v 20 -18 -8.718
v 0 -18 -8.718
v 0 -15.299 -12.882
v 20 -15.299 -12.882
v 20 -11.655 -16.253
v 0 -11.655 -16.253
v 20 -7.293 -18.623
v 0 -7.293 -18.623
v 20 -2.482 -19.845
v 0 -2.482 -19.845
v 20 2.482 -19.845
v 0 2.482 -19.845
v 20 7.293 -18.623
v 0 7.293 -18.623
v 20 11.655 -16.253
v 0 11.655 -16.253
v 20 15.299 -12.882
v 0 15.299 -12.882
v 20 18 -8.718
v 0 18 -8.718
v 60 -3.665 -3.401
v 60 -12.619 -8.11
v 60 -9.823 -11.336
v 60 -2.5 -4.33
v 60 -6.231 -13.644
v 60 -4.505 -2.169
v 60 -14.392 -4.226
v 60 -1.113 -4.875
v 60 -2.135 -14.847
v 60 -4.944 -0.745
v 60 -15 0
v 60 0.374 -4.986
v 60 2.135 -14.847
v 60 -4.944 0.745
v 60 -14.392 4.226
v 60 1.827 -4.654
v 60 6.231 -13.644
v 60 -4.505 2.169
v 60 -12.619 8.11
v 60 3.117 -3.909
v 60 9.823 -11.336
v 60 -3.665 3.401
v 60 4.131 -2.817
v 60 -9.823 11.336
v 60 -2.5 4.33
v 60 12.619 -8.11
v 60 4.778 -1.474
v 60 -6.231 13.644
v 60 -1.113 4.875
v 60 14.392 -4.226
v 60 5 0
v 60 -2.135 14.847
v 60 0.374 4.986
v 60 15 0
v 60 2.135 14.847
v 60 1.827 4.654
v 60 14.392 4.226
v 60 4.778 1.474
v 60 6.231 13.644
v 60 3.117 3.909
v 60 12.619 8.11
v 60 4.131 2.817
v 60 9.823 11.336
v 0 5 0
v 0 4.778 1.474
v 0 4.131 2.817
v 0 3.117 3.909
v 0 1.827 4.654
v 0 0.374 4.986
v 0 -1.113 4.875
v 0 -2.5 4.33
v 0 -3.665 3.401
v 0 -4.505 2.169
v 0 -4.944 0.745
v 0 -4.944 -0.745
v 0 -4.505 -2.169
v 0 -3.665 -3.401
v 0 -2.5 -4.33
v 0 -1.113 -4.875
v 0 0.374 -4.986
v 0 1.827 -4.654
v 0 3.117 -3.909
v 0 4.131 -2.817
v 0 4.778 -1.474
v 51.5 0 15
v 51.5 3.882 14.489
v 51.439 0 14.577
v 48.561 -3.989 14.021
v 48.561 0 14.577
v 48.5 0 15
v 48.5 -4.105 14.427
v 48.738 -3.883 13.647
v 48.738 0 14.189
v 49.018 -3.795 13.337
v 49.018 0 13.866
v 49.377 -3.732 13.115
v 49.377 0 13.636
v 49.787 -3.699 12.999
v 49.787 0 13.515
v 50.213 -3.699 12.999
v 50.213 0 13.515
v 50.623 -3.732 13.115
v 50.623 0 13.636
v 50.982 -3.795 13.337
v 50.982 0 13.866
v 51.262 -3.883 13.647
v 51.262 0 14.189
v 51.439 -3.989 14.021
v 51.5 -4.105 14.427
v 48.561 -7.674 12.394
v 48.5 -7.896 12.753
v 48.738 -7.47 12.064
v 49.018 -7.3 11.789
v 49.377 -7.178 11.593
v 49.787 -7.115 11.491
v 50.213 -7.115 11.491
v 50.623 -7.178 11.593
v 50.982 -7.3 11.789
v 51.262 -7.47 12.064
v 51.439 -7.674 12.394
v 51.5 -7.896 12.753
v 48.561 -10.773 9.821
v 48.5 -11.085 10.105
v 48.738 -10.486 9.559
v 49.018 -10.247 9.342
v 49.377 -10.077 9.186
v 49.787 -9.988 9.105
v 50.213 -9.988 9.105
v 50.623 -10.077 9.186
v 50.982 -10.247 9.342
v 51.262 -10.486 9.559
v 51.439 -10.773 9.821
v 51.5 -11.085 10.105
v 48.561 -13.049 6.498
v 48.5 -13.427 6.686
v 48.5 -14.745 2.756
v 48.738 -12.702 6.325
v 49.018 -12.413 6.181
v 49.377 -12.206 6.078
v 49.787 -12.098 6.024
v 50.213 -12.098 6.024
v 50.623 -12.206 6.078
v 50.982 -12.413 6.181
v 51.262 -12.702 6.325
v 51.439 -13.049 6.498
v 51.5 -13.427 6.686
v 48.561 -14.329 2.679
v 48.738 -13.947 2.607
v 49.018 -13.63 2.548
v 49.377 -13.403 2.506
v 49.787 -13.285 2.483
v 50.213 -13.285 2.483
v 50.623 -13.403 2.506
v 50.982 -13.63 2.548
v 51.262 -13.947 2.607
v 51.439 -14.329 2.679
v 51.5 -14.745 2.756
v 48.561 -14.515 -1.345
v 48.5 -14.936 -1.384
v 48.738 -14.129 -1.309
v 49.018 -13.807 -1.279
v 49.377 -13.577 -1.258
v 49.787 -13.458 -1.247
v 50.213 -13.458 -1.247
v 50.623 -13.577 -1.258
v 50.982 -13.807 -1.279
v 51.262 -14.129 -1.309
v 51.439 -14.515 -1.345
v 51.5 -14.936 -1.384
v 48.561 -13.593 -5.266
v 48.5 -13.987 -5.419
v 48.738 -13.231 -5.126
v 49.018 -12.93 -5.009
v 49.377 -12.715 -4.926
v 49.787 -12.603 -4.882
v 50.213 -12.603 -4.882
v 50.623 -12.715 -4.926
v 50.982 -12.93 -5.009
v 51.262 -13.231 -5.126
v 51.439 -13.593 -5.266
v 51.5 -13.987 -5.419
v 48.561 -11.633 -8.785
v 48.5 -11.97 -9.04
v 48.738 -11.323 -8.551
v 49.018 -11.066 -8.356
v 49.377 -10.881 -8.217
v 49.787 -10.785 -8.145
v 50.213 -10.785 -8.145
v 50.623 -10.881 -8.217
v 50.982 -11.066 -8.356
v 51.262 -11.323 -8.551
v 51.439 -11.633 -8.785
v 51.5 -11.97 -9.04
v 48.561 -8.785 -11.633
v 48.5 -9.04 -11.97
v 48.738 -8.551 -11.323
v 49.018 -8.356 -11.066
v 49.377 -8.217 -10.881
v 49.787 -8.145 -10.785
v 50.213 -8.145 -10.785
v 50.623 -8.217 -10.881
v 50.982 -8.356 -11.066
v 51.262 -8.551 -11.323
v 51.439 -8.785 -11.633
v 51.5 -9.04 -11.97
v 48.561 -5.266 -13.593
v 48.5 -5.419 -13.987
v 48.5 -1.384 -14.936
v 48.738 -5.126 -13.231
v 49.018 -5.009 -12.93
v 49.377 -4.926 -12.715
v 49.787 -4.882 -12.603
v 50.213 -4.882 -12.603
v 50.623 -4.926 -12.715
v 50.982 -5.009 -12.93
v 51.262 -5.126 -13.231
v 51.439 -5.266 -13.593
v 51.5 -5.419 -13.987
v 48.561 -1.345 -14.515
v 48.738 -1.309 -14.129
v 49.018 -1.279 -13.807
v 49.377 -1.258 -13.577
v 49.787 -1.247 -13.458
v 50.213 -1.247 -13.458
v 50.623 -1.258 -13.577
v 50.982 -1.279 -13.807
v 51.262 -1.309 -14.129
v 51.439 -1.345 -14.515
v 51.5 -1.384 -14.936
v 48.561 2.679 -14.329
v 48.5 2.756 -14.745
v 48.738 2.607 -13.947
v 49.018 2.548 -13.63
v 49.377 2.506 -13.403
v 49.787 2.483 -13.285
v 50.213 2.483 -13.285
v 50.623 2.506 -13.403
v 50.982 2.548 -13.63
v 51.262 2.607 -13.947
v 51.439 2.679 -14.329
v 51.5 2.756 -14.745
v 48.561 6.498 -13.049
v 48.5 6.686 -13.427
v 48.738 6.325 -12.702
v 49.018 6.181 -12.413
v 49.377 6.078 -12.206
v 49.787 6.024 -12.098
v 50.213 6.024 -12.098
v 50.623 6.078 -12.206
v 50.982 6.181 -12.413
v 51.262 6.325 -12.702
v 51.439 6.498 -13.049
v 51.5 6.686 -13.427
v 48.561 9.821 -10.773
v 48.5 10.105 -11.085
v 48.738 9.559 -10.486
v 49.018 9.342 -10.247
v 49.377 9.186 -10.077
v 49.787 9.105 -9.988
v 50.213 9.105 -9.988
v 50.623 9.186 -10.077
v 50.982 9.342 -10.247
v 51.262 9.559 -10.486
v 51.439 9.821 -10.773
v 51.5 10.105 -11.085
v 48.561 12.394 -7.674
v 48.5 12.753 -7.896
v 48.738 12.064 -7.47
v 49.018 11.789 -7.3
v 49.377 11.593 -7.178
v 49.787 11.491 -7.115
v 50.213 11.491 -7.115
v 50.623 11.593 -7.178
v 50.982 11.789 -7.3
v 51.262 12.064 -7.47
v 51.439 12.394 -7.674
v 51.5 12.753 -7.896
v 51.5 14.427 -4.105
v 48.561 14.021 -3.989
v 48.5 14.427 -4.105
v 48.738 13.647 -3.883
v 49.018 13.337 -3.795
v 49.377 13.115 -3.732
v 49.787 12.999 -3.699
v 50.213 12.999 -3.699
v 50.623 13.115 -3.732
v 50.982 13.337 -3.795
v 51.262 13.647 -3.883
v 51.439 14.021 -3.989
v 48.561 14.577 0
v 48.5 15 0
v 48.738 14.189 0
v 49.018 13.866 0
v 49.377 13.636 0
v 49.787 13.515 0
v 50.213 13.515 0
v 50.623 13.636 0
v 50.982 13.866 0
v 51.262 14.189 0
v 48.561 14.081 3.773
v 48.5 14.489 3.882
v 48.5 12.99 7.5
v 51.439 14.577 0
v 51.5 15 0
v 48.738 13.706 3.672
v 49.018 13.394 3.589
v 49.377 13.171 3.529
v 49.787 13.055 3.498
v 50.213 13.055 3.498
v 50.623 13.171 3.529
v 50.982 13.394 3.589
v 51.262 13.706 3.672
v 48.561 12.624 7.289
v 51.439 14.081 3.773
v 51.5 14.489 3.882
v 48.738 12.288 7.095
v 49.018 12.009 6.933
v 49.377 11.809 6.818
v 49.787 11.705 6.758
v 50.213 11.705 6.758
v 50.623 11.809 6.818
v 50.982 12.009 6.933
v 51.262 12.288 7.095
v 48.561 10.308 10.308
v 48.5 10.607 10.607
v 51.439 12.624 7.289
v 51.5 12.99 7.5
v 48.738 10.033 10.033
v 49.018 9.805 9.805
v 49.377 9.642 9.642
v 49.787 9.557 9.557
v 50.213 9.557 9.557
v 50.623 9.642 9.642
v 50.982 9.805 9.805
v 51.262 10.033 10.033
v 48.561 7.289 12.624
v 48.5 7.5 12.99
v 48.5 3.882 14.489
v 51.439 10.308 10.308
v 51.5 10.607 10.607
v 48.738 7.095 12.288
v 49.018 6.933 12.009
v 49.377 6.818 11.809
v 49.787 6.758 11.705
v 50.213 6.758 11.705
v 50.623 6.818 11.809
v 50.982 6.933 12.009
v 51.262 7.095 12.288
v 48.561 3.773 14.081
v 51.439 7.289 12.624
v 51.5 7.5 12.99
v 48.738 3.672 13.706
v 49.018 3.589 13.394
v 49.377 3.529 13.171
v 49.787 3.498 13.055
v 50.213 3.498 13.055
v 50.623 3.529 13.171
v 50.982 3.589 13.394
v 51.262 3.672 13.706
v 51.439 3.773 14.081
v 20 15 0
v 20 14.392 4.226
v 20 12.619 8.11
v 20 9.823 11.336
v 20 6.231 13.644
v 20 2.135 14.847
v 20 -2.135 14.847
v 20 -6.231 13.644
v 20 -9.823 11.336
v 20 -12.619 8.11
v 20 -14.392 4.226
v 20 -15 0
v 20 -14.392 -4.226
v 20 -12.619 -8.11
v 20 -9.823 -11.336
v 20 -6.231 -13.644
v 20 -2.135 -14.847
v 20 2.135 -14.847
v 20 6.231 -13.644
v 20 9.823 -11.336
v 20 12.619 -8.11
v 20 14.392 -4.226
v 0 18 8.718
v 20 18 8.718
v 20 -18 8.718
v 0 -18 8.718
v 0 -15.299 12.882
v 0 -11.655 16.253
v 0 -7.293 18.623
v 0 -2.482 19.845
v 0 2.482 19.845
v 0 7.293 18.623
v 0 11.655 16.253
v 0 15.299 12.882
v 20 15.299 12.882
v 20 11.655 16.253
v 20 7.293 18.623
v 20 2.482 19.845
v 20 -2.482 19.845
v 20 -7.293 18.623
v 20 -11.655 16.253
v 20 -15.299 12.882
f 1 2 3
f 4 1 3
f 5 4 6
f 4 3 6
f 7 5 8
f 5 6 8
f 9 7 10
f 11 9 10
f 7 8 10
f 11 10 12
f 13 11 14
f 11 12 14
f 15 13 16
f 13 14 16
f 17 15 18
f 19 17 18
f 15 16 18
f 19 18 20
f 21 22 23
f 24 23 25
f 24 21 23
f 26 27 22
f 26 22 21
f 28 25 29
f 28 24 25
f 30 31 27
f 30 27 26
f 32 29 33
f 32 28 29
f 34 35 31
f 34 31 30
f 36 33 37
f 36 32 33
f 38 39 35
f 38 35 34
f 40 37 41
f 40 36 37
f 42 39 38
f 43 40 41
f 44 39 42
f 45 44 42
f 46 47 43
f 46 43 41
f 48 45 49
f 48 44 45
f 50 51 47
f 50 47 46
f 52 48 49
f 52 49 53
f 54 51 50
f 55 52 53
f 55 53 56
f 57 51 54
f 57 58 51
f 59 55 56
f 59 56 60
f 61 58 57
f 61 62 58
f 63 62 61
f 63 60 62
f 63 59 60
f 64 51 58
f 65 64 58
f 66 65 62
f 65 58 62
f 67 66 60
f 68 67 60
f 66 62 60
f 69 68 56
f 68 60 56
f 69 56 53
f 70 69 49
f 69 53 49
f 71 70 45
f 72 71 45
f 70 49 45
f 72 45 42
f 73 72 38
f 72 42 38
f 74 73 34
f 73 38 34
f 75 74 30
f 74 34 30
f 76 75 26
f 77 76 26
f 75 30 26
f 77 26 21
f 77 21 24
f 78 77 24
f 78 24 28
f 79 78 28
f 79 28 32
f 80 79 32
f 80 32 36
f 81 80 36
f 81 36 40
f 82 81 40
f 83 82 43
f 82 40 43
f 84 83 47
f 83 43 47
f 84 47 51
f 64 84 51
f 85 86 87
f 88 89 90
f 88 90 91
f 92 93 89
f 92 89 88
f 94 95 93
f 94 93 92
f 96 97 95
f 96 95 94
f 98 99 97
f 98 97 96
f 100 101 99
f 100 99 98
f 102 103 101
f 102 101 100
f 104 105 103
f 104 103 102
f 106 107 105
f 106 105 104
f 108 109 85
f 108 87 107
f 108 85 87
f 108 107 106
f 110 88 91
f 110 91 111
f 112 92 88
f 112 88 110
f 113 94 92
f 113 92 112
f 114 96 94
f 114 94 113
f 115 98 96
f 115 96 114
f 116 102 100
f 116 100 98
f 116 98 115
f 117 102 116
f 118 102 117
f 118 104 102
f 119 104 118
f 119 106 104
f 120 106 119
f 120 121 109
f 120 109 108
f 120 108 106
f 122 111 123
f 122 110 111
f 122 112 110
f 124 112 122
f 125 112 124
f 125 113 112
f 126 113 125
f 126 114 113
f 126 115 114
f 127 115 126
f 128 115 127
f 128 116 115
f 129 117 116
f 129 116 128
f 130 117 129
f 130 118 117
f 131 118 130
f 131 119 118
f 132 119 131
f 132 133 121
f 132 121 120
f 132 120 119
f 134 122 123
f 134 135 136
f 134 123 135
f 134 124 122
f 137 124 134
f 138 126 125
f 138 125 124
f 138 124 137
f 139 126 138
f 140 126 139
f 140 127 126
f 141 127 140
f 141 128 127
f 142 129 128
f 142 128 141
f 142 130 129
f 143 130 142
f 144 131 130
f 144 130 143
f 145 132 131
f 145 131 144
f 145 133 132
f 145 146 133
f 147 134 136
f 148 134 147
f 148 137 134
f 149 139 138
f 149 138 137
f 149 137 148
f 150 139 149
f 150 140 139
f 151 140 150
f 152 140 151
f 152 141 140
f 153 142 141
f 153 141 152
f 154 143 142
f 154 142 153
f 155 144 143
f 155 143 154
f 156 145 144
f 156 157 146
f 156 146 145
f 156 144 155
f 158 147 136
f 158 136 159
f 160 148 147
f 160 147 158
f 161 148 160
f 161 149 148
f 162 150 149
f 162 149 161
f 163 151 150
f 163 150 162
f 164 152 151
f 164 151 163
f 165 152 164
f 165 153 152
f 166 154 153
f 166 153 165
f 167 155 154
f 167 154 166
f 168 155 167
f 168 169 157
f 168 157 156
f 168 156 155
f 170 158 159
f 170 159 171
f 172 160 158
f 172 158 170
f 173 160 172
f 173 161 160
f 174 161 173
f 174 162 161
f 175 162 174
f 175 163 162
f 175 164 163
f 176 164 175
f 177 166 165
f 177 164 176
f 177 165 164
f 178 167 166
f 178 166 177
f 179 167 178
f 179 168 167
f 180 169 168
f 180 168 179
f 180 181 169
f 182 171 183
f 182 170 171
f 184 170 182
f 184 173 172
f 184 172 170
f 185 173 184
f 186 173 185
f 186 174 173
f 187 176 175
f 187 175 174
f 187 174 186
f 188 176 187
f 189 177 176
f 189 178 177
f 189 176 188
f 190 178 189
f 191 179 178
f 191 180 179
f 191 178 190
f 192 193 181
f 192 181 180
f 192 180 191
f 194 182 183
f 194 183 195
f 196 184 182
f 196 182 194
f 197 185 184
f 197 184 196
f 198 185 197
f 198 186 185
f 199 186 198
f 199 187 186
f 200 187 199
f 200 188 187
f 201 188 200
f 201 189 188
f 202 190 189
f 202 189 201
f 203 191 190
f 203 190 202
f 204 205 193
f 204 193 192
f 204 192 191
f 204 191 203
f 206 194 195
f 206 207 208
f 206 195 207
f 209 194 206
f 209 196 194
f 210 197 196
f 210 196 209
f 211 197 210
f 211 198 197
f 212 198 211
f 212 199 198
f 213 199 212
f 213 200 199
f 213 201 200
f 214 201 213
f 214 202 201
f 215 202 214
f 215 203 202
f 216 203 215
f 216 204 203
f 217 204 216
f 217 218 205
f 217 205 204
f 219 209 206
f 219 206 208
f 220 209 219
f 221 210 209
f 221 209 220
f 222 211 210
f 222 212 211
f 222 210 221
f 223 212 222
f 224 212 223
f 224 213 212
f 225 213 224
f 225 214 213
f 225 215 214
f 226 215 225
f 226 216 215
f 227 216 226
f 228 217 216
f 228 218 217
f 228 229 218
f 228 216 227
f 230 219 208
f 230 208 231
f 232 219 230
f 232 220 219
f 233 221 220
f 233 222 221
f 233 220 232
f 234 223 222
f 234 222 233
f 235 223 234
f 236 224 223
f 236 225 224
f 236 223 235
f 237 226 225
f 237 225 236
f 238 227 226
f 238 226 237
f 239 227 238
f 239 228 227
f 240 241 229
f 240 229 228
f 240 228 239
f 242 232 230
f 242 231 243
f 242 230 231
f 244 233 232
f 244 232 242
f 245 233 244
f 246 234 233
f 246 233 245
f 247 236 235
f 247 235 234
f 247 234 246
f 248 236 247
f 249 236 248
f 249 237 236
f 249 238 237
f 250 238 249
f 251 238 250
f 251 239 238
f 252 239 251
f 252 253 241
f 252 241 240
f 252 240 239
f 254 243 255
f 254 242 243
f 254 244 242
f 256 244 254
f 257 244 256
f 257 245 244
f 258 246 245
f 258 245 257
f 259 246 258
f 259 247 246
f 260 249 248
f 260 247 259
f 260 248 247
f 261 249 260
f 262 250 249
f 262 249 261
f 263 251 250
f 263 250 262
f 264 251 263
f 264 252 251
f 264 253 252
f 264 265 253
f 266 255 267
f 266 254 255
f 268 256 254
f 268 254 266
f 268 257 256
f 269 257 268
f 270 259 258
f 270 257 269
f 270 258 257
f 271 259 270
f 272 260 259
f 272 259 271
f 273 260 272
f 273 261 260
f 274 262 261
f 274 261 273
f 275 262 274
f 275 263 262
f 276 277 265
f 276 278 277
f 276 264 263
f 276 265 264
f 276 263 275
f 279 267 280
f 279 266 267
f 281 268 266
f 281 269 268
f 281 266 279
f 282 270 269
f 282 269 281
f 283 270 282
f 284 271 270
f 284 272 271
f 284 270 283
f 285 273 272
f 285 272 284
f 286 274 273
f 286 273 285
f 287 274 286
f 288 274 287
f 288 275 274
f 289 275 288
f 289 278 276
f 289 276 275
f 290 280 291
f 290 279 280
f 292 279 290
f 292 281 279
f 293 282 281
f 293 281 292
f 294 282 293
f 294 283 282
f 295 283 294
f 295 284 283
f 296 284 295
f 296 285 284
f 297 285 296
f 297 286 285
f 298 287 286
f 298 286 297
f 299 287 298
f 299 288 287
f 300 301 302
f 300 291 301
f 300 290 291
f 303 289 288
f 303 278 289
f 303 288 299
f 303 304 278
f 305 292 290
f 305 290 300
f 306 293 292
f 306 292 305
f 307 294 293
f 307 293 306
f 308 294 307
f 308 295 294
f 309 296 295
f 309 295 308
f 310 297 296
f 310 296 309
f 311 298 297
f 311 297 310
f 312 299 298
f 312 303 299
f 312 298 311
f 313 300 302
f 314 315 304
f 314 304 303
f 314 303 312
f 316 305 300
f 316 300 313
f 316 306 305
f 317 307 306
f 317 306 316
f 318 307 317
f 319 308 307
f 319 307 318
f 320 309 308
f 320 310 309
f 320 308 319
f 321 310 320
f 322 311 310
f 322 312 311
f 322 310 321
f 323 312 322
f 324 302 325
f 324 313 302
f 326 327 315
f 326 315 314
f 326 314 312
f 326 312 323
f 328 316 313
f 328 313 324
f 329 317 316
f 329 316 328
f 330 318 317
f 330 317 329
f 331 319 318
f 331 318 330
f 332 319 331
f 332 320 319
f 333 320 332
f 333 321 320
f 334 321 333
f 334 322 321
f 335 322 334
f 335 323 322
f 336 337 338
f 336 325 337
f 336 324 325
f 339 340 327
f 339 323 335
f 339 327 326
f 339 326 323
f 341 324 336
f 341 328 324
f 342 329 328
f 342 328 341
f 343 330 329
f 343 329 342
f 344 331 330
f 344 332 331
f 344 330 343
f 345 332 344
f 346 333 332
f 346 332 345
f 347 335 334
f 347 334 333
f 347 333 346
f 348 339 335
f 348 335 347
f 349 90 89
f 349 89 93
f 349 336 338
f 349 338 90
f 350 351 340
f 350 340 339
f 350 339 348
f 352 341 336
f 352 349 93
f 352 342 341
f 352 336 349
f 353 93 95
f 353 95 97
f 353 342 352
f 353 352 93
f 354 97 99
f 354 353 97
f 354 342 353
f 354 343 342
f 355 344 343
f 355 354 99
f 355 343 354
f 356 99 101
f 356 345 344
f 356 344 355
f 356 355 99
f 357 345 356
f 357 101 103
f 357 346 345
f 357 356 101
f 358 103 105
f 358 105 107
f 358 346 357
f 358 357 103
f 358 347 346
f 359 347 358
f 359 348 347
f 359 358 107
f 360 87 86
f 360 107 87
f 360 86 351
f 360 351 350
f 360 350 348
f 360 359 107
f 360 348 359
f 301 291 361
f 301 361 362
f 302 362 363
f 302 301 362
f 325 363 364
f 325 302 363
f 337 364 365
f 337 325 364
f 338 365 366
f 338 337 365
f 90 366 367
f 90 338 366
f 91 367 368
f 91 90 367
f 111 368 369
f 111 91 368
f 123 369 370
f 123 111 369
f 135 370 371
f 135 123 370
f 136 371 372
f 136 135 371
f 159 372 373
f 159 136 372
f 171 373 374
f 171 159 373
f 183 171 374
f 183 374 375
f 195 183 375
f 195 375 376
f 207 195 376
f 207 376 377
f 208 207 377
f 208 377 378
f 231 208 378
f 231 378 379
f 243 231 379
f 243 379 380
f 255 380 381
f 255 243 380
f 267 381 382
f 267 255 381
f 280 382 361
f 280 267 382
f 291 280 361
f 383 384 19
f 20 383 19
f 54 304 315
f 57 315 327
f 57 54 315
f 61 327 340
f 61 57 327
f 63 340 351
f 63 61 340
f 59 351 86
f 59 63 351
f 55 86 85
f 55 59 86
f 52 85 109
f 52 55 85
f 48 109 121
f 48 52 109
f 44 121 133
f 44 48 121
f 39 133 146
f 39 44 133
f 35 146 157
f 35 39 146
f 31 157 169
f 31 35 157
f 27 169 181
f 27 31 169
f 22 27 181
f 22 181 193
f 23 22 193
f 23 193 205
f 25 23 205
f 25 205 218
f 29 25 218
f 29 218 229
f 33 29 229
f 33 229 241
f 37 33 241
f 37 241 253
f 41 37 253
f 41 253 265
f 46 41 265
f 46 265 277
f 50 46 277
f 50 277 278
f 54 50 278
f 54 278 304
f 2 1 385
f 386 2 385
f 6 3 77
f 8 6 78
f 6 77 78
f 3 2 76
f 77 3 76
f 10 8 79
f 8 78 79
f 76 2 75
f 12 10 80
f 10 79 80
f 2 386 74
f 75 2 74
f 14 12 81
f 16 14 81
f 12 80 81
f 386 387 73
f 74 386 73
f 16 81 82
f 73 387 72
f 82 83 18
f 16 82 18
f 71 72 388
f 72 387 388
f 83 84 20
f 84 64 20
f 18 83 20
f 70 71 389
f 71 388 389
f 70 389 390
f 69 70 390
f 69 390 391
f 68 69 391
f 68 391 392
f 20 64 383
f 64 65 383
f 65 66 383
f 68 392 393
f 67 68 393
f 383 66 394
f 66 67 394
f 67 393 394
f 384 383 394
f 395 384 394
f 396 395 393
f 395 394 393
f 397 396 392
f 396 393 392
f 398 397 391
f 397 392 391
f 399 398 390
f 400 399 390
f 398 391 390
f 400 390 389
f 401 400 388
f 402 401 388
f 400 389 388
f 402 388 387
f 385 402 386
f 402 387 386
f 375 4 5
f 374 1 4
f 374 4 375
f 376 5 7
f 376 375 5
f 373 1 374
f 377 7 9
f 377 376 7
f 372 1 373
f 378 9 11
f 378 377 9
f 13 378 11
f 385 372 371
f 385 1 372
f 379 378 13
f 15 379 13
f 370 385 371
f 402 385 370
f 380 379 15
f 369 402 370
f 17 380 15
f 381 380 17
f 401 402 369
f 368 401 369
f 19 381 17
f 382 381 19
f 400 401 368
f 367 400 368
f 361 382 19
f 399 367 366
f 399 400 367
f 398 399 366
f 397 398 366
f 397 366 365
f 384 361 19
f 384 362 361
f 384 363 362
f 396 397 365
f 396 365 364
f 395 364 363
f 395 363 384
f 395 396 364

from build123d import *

# Parameters (mm, degrees)
F0_R     = 20
F1_DEPTH = 60
F2_R     = 20
F2_R_2   = 15
F3_DEPTH = 40
F5_DEPTH = 20
F6_R     = 1.5
F8_R     = 5
F9_DEPTH = 60


with BuildPart() as f1:
    # F0 (on Right) → F1 (new body)
    with BuildSketch(Plane.YZ):
        Circle(F0_R)
    extrude(amount=F1_DEPTH)

    # F2 (on face) → F3 (cut)
    with BuildSketch(Plane.YZ.offset(60)):
        Circle(F2_R)
        Circle(F2_R_2, mode=Mode.SUBTRACT)
    extrude(amount=-F3_DEPTH, mode=Mode.SUBTRACT)

    # F4 (on face) → F5 (cut)
    with BuildSketch(Plane.YZ.offset(20)):
        with BuildLine():
            Line((-18, -8.717798), (-18, 8.717798))
            ThreePointArc((-18, 8.717798), (-20, 0), (-18, -8.717798))
        make_face()
        with BuildLine():
            ThreePointArc((18, -8.717798), (20, 0), (18, 8.717798))
            Line((18, 8.717798), (18, -8.717798))
        make_face()
    extrude(amount=-F5_DEPTH, mode=Mode.SUBTRACT)

    # F6 (on Front) → F7 (revolve, cut)
    with BuildSketch(Plane.XZ):
        with Locations((50, 15)):
            Circle(F6_R)
    revolve(axis=Axis((60, 0, 0), (1, 0, 0)), mode=Mode.SUBTRACT)

    # F8 (on face) → F9 (cut)
    with BuildSketch(Plane.YZ.offset(60)):
        Circle(F8_R)
    extrude(amount=-F9_DEPTH, mode=Mode.SUBTRACT)


solid = f1.part
